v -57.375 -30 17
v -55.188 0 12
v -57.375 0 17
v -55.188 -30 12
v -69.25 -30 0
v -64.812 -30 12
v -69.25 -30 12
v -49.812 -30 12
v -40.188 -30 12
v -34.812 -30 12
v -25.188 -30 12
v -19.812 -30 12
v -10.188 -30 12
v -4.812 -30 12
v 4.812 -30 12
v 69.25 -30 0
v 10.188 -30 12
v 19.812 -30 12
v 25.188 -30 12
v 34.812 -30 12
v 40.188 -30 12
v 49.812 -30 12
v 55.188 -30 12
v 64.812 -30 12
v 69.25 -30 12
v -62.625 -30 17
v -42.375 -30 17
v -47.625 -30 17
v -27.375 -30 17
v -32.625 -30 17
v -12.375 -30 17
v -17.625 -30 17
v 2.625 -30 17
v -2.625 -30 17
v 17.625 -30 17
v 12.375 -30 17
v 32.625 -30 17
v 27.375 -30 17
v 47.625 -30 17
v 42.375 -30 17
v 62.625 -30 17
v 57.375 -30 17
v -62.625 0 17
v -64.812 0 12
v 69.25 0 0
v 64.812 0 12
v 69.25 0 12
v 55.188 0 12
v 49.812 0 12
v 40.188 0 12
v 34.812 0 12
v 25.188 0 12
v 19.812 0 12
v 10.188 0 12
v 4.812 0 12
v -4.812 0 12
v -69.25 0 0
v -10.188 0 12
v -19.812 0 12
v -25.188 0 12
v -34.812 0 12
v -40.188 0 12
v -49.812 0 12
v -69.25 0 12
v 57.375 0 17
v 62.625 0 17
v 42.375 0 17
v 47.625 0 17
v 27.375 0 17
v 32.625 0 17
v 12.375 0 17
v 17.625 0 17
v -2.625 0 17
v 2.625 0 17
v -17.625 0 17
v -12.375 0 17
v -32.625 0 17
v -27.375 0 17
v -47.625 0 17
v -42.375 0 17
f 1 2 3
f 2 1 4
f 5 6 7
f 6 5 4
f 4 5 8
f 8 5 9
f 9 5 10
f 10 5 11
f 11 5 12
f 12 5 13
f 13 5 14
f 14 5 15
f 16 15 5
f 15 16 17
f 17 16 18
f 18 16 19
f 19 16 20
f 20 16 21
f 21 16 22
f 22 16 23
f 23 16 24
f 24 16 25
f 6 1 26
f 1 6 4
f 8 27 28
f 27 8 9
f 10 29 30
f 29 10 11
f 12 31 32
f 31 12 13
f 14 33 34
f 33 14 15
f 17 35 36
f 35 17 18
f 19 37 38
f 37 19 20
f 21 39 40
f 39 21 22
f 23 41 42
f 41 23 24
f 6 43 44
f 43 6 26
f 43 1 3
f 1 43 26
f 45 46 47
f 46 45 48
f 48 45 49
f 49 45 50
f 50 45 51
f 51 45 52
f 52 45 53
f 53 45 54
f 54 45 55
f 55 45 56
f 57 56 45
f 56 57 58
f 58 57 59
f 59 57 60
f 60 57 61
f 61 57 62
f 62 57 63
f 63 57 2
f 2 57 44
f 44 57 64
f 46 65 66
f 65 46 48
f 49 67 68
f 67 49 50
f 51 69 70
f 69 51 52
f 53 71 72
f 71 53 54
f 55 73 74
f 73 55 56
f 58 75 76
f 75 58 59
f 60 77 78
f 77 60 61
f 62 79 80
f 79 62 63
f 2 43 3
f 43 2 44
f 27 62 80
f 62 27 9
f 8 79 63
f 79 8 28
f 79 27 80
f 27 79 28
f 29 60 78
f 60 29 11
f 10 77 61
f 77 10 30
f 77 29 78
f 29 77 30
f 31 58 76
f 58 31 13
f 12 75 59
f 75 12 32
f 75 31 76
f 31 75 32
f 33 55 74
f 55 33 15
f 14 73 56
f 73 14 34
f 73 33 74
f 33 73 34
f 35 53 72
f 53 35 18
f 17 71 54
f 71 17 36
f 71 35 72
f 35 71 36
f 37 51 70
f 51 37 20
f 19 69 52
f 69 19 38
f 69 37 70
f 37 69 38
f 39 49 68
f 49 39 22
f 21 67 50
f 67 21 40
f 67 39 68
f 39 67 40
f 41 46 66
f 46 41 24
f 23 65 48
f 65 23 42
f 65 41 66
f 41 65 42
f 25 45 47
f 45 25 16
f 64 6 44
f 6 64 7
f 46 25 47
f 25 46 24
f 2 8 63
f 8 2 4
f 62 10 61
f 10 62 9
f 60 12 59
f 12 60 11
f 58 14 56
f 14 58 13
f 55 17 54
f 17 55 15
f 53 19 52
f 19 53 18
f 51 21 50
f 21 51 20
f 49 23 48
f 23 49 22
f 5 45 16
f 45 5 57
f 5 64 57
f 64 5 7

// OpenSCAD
$fn = 32;

// ----------------------------------------------------------------------
// Toothed rack, 9 teeth
// 15 mm pitch, 5 mm teeth
// ----------------------------------------------------------------------

// --- parameters (mm) ---
bar_w = 30;      // bar width (Y)
bar_h = 12;      // bar height (Z)
teeth = 9;       // number of teeth
pitch = 15;      // tooth pitch
tooth_h = 5;     // tooth height above the bar
root_w = 10.5;   // tooth width at the root
crest_w = 5.25;  // tooth width at the crest

// --- derived feature positions (mm) ---
span = (teeth - 1) * pitch;  // = 120   distance between the outer teeth
bar_l = span + root_w + 8;   // = 138.5   bar length: teeth plus 4 mm at each end
tooth_x = -span / 2;         // = -60   X of the first tooth
height = bar_h + tooth_h;    // = 17   overall height
feature_centers = [
  [tooth_x + 0 * pitch, -bar_w / 2],
  [tooth_x + 1 * pitch, -bar_w / 2],
  [tooth_x + 2 * pitch, -bar_w / 2],
  [tooth_x + 3 * pitch, -bar_w / 2],
  [tooth_x + 4 * pitch, -bar_w / 2],
  [tooth_x + 5 * pitch, -bar_w / 2],
  [tooth_x + 6 * pitch, -bar_w / 2],
  [tooth_x + 7 * pitch, -bar_w / 2],
  [tooth_x + 8 * pitch, -bar_w / 2]
];   // tooth centre line, drives the tooth loop

// bar with a rack of teeth, one extruded trapezoium per centre
module rack_tooth() {
  linear_extrude(height = bar_w)
    polygon(points = [
      [0, 0],
      [root_w, 0],
      [root_w / 2 + crest_w / 2, tooth_h + 1],
      [root_w / 2 - crest_w / 2, tooth_h + 1]
    ]);
}

union() {
  translate([-bar_l / 2, -bar_w, 0]) cube([bar_l, bar_w, bar_h]);
  for (centre = feature_centers)
    translate([centre[0] - root_w / 2, 0, bar_h - 1]) rotate([90, 0, 0]) rack_tooth();
}
